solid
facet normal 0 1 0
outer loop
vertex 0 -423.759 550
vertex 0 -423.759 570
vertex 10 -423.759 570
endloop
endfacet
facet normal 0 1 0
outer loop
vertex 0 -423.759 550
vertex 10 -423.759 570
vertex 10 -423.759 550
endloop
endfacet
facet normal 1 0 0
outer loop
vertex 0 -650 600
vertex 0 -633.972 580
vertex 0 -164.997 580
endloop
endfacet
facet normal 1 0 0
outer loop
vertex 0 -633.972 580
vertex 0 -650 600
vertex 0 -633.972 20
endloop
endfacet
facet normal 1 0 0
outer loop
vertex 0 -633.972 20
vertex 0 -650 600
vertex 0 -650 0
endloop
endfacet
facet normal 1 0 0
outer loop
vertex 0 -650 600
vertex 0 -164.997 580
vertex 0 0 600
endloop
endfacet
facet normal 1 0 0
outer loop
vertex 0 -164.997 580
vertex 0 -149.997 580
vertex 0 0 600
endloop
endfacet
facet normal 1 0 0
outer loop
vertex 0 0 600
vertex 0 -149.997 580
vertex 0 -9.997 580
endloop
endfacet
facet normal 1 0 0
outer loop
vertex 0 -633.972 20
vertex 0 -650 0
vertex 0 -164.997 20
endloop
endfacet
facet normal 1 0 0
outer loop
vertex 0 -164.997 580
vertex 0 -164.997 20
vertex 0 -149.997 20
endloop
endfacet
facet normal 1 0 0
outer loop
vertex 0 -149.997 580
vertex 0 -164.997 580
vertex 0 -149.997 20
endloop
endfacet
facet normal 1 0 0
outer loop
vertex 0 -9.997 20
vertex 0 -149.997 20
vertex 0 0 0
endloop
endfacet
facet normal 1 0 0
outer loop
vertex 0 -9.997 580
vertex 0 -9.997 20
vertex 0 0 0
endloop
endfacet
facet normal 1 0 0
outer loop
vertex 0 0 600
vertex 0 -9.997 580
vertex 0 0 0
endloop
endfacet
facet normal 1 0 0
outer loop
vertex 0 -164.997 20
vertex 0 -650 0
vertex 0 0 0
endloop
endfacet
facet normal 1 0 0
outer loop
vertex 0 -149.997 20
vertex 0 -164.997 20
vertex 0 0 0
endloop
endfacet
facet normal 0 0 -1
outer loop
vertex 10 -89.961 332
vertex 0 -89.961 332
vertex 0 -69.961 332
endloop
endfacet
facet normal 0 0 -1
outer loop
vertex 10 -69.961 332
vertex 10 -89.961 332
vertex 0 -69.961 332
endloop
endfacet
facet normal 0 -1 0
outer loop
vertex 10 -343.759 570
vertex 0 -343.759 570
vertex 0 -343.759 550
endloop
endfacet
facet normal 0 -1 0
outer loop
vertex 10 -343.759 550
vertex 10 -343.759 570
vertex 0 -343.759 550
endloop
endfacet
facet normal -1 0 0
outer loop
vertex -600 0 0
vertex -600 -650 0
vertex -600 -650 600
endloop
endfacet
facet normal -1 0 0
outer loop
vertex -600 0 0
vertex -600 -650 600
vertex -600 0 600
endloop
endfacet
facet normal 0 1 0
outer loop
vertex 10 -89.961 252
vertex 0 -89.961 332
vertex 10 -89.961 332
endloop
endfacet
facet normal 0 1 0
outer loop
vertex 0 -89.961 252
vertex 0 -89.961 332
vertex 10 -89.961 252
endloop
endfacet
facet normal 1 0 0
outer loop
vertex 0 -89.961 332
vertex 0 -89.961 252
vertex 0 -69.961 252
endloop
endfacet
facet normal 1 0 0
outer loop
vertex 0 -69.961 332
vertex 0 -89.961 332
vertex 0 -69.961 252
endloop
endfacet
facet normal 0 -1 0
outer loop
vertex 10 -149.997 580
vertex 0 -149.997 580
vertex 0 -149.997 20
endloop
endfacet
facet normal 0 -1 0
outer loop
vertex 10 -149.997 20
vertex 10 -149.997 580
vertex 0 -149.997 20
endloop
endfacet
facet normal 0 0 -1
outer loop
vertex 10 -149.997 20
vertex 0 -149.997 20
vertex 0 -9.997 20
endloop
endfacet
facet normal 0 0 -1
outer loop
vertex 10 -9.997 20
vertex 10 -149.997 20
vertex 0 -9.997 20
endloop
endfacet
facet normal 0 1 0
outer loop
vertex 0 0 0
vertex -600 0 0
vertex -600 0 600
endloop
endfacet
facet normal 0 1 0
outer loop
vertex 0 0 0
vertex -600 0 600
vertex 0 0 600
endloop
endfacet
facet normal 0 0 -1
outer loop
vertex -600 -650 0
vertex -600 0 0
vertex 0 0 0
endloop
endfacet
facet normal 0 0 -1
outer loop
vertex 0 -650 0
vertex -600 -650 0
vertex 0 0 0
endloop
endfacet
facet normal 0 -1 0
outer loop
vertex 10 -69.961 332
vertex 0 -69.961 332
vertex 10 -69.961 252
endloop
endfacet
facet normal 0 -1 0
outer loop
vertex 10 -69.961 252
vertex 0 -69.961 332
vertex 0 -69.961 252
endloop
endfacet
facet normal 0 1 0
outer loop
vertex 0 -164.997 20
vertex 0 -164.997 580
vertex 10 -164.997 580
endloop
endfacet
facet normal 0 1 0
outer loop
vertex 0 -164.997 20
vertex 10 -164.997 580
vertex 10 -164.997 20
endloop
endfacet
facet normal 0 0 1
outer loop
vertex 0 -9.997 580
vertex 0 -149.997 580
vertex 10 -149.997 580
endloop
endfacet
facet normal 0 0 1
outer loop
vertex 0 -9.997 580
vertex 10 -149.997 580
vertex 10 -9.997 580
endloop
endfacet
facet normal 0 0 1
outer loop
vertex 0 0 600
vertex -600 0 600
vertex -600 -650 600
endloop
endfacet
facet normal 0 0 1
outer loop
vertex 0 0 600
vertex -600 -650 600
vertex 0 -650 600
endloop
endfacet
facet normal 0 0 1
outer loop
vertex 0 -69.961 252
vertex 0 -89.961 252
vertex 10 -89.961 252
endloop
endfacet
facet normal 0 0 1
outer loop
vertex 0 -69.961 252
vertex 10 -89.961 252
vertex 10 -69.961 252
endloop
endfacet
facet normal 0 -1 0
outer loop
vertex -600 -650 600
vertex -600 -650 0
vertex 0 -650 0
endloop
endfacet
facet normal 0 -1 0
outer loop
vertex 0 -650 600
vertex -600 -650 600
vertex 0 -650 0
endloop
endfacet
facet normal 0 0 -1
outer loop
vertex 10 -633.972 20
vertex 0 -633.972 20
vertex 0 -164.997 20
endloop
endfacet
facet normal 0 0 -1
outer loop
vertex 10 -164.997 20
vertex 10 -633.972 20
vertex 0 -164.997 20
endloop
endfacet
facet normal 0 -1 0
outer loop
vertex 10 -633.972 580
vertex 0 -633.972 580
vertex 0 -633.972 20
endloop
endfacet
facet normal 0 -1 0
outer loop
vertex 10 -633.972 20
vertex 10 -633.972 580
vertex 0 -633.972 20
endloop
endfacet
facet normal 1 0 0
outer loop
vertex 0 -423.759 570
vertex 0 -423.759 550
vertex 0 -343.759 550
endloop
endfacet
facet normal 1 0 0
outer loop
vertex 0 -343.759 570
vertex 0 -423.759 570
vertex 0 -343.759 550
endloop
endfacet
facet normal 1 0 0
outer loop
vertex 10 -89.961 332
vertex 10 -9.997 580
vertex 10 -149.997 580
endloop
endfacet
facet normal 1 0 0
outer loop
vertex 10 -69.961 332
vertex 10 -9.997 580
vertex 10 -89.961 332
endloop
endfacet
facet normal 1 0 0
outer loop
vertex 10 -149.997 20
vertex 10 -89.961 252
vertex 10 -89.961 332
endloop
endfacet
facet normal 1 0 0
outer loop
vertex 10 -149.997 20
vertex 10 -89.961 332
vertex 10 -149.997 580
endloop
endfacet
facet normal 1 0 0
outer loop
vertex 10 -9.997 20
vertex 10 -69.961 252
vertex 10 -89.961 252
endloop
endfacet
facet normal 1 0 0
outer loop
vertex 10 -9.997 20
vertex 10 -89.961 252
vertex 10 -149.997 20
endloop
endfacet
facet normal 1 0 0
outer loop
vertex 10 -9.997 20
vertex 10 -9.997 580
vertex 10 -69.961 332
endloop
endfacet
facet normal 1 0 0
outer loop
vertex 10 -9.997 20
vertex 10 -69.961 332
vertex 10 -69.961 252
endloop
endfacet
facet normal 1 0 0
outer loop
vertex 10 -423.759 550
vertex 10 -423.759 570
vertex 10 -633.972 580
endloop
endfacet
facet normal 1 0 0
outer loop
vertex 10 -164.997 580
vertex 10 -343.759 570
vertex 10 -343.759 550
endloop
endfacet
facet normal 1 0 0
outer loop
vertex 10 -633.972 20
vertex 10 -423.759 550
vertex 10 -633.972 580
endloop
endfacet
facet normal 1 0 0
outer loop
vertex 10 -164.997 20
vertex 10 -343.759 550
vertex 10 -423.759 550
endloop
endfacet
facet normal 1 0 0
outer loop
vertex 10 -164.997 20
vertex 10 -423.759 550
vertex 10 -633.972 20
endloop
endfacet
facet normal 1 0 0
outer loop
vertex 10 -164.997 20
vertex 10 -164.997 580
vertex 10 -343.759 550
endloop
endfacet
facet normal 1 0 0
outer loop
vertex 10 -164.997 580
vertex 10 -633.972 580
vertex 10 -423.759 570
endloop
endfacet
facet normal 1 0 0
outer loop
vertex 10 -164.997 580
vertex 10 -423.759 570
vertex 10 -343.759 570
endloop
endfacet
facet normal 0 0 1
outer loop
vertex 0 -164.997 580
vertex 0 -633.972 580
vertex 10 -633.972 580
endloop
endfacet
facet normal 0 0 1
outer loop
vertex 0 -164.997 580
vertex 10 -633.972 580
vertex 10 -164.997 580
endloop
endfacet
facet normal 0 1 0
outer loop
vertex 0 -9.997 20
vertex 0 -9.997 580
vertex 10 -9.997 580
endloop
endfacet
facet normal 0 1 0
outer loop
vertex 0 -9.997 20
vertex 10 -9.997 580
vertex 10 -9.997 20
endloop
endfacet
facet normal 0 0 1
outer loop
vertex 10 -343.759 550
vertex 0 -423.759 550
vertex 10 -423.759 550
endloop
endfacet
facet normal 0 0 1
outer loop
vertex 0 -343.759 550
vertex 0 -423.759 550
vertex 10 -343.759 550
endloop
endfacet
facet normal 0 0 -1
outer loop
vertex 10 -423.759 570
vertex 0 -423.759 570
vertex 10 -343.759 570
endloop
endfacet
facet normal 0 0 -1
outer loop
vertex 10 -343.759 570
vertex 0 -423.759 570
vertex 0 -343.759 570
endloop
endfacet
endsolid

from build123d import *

# Parameters (mm, degrees)
SKETCH1_W           = 600
SKETCH1_H           = 650
BOSS_EXTRUDE1_DEPTH = 600
SKETCH2_W           = 560
SKETCH2_H           = 140
SKETCH2_W_2         = 80
SKETCH2_H_2         = 20
SKETCH2_H_3         = 468.975468976
SKETCH2_W_3         = 20
SKETCH2_H_4         = 80
BOSS_EXTRUDE2_DEPTH = 10


with BuildPart() as part:
    # Sketch1 → Boss-Extrude1 (new body)
    with BuildSketch(Plane.XY):
        with Locations((-300, -325)):
            Rectangle(SKETCH1_W, SKETCH1_H)
    extrude(amount=BOSS_EXTRUDE1_DEPTH)

    # Sketch2 → Boss-Extrude2 (add)
    with BuildSketch(Plane(origin=(0, 0, 0), x_dir=(0, 0, -1), z_dir=(1, 0, 0))):
        with Locations((-300, -79.996604702)):
            Rectangle(SKETCH2_W, SKETCH2_H)
        with Locations((-292, -79.960529666)):
            Rectangle(SKETCH2_W_2, SKETCH2_H_2, mode=Mode.SUBTRACT)
        with Locations((-300, -399.48433919)):
            Rectangle(SKETCH2_W, SKETCH2_H_3)
        with Locations((-560, -383.759018759)):
            Rectangle(SKETCH2_W_3, SKETCH2_H_4, mode=Mode.SUBTRACT)
    extrude(amount=BOSS_EXTRUDE2_DEPTH)


solid = part.part
